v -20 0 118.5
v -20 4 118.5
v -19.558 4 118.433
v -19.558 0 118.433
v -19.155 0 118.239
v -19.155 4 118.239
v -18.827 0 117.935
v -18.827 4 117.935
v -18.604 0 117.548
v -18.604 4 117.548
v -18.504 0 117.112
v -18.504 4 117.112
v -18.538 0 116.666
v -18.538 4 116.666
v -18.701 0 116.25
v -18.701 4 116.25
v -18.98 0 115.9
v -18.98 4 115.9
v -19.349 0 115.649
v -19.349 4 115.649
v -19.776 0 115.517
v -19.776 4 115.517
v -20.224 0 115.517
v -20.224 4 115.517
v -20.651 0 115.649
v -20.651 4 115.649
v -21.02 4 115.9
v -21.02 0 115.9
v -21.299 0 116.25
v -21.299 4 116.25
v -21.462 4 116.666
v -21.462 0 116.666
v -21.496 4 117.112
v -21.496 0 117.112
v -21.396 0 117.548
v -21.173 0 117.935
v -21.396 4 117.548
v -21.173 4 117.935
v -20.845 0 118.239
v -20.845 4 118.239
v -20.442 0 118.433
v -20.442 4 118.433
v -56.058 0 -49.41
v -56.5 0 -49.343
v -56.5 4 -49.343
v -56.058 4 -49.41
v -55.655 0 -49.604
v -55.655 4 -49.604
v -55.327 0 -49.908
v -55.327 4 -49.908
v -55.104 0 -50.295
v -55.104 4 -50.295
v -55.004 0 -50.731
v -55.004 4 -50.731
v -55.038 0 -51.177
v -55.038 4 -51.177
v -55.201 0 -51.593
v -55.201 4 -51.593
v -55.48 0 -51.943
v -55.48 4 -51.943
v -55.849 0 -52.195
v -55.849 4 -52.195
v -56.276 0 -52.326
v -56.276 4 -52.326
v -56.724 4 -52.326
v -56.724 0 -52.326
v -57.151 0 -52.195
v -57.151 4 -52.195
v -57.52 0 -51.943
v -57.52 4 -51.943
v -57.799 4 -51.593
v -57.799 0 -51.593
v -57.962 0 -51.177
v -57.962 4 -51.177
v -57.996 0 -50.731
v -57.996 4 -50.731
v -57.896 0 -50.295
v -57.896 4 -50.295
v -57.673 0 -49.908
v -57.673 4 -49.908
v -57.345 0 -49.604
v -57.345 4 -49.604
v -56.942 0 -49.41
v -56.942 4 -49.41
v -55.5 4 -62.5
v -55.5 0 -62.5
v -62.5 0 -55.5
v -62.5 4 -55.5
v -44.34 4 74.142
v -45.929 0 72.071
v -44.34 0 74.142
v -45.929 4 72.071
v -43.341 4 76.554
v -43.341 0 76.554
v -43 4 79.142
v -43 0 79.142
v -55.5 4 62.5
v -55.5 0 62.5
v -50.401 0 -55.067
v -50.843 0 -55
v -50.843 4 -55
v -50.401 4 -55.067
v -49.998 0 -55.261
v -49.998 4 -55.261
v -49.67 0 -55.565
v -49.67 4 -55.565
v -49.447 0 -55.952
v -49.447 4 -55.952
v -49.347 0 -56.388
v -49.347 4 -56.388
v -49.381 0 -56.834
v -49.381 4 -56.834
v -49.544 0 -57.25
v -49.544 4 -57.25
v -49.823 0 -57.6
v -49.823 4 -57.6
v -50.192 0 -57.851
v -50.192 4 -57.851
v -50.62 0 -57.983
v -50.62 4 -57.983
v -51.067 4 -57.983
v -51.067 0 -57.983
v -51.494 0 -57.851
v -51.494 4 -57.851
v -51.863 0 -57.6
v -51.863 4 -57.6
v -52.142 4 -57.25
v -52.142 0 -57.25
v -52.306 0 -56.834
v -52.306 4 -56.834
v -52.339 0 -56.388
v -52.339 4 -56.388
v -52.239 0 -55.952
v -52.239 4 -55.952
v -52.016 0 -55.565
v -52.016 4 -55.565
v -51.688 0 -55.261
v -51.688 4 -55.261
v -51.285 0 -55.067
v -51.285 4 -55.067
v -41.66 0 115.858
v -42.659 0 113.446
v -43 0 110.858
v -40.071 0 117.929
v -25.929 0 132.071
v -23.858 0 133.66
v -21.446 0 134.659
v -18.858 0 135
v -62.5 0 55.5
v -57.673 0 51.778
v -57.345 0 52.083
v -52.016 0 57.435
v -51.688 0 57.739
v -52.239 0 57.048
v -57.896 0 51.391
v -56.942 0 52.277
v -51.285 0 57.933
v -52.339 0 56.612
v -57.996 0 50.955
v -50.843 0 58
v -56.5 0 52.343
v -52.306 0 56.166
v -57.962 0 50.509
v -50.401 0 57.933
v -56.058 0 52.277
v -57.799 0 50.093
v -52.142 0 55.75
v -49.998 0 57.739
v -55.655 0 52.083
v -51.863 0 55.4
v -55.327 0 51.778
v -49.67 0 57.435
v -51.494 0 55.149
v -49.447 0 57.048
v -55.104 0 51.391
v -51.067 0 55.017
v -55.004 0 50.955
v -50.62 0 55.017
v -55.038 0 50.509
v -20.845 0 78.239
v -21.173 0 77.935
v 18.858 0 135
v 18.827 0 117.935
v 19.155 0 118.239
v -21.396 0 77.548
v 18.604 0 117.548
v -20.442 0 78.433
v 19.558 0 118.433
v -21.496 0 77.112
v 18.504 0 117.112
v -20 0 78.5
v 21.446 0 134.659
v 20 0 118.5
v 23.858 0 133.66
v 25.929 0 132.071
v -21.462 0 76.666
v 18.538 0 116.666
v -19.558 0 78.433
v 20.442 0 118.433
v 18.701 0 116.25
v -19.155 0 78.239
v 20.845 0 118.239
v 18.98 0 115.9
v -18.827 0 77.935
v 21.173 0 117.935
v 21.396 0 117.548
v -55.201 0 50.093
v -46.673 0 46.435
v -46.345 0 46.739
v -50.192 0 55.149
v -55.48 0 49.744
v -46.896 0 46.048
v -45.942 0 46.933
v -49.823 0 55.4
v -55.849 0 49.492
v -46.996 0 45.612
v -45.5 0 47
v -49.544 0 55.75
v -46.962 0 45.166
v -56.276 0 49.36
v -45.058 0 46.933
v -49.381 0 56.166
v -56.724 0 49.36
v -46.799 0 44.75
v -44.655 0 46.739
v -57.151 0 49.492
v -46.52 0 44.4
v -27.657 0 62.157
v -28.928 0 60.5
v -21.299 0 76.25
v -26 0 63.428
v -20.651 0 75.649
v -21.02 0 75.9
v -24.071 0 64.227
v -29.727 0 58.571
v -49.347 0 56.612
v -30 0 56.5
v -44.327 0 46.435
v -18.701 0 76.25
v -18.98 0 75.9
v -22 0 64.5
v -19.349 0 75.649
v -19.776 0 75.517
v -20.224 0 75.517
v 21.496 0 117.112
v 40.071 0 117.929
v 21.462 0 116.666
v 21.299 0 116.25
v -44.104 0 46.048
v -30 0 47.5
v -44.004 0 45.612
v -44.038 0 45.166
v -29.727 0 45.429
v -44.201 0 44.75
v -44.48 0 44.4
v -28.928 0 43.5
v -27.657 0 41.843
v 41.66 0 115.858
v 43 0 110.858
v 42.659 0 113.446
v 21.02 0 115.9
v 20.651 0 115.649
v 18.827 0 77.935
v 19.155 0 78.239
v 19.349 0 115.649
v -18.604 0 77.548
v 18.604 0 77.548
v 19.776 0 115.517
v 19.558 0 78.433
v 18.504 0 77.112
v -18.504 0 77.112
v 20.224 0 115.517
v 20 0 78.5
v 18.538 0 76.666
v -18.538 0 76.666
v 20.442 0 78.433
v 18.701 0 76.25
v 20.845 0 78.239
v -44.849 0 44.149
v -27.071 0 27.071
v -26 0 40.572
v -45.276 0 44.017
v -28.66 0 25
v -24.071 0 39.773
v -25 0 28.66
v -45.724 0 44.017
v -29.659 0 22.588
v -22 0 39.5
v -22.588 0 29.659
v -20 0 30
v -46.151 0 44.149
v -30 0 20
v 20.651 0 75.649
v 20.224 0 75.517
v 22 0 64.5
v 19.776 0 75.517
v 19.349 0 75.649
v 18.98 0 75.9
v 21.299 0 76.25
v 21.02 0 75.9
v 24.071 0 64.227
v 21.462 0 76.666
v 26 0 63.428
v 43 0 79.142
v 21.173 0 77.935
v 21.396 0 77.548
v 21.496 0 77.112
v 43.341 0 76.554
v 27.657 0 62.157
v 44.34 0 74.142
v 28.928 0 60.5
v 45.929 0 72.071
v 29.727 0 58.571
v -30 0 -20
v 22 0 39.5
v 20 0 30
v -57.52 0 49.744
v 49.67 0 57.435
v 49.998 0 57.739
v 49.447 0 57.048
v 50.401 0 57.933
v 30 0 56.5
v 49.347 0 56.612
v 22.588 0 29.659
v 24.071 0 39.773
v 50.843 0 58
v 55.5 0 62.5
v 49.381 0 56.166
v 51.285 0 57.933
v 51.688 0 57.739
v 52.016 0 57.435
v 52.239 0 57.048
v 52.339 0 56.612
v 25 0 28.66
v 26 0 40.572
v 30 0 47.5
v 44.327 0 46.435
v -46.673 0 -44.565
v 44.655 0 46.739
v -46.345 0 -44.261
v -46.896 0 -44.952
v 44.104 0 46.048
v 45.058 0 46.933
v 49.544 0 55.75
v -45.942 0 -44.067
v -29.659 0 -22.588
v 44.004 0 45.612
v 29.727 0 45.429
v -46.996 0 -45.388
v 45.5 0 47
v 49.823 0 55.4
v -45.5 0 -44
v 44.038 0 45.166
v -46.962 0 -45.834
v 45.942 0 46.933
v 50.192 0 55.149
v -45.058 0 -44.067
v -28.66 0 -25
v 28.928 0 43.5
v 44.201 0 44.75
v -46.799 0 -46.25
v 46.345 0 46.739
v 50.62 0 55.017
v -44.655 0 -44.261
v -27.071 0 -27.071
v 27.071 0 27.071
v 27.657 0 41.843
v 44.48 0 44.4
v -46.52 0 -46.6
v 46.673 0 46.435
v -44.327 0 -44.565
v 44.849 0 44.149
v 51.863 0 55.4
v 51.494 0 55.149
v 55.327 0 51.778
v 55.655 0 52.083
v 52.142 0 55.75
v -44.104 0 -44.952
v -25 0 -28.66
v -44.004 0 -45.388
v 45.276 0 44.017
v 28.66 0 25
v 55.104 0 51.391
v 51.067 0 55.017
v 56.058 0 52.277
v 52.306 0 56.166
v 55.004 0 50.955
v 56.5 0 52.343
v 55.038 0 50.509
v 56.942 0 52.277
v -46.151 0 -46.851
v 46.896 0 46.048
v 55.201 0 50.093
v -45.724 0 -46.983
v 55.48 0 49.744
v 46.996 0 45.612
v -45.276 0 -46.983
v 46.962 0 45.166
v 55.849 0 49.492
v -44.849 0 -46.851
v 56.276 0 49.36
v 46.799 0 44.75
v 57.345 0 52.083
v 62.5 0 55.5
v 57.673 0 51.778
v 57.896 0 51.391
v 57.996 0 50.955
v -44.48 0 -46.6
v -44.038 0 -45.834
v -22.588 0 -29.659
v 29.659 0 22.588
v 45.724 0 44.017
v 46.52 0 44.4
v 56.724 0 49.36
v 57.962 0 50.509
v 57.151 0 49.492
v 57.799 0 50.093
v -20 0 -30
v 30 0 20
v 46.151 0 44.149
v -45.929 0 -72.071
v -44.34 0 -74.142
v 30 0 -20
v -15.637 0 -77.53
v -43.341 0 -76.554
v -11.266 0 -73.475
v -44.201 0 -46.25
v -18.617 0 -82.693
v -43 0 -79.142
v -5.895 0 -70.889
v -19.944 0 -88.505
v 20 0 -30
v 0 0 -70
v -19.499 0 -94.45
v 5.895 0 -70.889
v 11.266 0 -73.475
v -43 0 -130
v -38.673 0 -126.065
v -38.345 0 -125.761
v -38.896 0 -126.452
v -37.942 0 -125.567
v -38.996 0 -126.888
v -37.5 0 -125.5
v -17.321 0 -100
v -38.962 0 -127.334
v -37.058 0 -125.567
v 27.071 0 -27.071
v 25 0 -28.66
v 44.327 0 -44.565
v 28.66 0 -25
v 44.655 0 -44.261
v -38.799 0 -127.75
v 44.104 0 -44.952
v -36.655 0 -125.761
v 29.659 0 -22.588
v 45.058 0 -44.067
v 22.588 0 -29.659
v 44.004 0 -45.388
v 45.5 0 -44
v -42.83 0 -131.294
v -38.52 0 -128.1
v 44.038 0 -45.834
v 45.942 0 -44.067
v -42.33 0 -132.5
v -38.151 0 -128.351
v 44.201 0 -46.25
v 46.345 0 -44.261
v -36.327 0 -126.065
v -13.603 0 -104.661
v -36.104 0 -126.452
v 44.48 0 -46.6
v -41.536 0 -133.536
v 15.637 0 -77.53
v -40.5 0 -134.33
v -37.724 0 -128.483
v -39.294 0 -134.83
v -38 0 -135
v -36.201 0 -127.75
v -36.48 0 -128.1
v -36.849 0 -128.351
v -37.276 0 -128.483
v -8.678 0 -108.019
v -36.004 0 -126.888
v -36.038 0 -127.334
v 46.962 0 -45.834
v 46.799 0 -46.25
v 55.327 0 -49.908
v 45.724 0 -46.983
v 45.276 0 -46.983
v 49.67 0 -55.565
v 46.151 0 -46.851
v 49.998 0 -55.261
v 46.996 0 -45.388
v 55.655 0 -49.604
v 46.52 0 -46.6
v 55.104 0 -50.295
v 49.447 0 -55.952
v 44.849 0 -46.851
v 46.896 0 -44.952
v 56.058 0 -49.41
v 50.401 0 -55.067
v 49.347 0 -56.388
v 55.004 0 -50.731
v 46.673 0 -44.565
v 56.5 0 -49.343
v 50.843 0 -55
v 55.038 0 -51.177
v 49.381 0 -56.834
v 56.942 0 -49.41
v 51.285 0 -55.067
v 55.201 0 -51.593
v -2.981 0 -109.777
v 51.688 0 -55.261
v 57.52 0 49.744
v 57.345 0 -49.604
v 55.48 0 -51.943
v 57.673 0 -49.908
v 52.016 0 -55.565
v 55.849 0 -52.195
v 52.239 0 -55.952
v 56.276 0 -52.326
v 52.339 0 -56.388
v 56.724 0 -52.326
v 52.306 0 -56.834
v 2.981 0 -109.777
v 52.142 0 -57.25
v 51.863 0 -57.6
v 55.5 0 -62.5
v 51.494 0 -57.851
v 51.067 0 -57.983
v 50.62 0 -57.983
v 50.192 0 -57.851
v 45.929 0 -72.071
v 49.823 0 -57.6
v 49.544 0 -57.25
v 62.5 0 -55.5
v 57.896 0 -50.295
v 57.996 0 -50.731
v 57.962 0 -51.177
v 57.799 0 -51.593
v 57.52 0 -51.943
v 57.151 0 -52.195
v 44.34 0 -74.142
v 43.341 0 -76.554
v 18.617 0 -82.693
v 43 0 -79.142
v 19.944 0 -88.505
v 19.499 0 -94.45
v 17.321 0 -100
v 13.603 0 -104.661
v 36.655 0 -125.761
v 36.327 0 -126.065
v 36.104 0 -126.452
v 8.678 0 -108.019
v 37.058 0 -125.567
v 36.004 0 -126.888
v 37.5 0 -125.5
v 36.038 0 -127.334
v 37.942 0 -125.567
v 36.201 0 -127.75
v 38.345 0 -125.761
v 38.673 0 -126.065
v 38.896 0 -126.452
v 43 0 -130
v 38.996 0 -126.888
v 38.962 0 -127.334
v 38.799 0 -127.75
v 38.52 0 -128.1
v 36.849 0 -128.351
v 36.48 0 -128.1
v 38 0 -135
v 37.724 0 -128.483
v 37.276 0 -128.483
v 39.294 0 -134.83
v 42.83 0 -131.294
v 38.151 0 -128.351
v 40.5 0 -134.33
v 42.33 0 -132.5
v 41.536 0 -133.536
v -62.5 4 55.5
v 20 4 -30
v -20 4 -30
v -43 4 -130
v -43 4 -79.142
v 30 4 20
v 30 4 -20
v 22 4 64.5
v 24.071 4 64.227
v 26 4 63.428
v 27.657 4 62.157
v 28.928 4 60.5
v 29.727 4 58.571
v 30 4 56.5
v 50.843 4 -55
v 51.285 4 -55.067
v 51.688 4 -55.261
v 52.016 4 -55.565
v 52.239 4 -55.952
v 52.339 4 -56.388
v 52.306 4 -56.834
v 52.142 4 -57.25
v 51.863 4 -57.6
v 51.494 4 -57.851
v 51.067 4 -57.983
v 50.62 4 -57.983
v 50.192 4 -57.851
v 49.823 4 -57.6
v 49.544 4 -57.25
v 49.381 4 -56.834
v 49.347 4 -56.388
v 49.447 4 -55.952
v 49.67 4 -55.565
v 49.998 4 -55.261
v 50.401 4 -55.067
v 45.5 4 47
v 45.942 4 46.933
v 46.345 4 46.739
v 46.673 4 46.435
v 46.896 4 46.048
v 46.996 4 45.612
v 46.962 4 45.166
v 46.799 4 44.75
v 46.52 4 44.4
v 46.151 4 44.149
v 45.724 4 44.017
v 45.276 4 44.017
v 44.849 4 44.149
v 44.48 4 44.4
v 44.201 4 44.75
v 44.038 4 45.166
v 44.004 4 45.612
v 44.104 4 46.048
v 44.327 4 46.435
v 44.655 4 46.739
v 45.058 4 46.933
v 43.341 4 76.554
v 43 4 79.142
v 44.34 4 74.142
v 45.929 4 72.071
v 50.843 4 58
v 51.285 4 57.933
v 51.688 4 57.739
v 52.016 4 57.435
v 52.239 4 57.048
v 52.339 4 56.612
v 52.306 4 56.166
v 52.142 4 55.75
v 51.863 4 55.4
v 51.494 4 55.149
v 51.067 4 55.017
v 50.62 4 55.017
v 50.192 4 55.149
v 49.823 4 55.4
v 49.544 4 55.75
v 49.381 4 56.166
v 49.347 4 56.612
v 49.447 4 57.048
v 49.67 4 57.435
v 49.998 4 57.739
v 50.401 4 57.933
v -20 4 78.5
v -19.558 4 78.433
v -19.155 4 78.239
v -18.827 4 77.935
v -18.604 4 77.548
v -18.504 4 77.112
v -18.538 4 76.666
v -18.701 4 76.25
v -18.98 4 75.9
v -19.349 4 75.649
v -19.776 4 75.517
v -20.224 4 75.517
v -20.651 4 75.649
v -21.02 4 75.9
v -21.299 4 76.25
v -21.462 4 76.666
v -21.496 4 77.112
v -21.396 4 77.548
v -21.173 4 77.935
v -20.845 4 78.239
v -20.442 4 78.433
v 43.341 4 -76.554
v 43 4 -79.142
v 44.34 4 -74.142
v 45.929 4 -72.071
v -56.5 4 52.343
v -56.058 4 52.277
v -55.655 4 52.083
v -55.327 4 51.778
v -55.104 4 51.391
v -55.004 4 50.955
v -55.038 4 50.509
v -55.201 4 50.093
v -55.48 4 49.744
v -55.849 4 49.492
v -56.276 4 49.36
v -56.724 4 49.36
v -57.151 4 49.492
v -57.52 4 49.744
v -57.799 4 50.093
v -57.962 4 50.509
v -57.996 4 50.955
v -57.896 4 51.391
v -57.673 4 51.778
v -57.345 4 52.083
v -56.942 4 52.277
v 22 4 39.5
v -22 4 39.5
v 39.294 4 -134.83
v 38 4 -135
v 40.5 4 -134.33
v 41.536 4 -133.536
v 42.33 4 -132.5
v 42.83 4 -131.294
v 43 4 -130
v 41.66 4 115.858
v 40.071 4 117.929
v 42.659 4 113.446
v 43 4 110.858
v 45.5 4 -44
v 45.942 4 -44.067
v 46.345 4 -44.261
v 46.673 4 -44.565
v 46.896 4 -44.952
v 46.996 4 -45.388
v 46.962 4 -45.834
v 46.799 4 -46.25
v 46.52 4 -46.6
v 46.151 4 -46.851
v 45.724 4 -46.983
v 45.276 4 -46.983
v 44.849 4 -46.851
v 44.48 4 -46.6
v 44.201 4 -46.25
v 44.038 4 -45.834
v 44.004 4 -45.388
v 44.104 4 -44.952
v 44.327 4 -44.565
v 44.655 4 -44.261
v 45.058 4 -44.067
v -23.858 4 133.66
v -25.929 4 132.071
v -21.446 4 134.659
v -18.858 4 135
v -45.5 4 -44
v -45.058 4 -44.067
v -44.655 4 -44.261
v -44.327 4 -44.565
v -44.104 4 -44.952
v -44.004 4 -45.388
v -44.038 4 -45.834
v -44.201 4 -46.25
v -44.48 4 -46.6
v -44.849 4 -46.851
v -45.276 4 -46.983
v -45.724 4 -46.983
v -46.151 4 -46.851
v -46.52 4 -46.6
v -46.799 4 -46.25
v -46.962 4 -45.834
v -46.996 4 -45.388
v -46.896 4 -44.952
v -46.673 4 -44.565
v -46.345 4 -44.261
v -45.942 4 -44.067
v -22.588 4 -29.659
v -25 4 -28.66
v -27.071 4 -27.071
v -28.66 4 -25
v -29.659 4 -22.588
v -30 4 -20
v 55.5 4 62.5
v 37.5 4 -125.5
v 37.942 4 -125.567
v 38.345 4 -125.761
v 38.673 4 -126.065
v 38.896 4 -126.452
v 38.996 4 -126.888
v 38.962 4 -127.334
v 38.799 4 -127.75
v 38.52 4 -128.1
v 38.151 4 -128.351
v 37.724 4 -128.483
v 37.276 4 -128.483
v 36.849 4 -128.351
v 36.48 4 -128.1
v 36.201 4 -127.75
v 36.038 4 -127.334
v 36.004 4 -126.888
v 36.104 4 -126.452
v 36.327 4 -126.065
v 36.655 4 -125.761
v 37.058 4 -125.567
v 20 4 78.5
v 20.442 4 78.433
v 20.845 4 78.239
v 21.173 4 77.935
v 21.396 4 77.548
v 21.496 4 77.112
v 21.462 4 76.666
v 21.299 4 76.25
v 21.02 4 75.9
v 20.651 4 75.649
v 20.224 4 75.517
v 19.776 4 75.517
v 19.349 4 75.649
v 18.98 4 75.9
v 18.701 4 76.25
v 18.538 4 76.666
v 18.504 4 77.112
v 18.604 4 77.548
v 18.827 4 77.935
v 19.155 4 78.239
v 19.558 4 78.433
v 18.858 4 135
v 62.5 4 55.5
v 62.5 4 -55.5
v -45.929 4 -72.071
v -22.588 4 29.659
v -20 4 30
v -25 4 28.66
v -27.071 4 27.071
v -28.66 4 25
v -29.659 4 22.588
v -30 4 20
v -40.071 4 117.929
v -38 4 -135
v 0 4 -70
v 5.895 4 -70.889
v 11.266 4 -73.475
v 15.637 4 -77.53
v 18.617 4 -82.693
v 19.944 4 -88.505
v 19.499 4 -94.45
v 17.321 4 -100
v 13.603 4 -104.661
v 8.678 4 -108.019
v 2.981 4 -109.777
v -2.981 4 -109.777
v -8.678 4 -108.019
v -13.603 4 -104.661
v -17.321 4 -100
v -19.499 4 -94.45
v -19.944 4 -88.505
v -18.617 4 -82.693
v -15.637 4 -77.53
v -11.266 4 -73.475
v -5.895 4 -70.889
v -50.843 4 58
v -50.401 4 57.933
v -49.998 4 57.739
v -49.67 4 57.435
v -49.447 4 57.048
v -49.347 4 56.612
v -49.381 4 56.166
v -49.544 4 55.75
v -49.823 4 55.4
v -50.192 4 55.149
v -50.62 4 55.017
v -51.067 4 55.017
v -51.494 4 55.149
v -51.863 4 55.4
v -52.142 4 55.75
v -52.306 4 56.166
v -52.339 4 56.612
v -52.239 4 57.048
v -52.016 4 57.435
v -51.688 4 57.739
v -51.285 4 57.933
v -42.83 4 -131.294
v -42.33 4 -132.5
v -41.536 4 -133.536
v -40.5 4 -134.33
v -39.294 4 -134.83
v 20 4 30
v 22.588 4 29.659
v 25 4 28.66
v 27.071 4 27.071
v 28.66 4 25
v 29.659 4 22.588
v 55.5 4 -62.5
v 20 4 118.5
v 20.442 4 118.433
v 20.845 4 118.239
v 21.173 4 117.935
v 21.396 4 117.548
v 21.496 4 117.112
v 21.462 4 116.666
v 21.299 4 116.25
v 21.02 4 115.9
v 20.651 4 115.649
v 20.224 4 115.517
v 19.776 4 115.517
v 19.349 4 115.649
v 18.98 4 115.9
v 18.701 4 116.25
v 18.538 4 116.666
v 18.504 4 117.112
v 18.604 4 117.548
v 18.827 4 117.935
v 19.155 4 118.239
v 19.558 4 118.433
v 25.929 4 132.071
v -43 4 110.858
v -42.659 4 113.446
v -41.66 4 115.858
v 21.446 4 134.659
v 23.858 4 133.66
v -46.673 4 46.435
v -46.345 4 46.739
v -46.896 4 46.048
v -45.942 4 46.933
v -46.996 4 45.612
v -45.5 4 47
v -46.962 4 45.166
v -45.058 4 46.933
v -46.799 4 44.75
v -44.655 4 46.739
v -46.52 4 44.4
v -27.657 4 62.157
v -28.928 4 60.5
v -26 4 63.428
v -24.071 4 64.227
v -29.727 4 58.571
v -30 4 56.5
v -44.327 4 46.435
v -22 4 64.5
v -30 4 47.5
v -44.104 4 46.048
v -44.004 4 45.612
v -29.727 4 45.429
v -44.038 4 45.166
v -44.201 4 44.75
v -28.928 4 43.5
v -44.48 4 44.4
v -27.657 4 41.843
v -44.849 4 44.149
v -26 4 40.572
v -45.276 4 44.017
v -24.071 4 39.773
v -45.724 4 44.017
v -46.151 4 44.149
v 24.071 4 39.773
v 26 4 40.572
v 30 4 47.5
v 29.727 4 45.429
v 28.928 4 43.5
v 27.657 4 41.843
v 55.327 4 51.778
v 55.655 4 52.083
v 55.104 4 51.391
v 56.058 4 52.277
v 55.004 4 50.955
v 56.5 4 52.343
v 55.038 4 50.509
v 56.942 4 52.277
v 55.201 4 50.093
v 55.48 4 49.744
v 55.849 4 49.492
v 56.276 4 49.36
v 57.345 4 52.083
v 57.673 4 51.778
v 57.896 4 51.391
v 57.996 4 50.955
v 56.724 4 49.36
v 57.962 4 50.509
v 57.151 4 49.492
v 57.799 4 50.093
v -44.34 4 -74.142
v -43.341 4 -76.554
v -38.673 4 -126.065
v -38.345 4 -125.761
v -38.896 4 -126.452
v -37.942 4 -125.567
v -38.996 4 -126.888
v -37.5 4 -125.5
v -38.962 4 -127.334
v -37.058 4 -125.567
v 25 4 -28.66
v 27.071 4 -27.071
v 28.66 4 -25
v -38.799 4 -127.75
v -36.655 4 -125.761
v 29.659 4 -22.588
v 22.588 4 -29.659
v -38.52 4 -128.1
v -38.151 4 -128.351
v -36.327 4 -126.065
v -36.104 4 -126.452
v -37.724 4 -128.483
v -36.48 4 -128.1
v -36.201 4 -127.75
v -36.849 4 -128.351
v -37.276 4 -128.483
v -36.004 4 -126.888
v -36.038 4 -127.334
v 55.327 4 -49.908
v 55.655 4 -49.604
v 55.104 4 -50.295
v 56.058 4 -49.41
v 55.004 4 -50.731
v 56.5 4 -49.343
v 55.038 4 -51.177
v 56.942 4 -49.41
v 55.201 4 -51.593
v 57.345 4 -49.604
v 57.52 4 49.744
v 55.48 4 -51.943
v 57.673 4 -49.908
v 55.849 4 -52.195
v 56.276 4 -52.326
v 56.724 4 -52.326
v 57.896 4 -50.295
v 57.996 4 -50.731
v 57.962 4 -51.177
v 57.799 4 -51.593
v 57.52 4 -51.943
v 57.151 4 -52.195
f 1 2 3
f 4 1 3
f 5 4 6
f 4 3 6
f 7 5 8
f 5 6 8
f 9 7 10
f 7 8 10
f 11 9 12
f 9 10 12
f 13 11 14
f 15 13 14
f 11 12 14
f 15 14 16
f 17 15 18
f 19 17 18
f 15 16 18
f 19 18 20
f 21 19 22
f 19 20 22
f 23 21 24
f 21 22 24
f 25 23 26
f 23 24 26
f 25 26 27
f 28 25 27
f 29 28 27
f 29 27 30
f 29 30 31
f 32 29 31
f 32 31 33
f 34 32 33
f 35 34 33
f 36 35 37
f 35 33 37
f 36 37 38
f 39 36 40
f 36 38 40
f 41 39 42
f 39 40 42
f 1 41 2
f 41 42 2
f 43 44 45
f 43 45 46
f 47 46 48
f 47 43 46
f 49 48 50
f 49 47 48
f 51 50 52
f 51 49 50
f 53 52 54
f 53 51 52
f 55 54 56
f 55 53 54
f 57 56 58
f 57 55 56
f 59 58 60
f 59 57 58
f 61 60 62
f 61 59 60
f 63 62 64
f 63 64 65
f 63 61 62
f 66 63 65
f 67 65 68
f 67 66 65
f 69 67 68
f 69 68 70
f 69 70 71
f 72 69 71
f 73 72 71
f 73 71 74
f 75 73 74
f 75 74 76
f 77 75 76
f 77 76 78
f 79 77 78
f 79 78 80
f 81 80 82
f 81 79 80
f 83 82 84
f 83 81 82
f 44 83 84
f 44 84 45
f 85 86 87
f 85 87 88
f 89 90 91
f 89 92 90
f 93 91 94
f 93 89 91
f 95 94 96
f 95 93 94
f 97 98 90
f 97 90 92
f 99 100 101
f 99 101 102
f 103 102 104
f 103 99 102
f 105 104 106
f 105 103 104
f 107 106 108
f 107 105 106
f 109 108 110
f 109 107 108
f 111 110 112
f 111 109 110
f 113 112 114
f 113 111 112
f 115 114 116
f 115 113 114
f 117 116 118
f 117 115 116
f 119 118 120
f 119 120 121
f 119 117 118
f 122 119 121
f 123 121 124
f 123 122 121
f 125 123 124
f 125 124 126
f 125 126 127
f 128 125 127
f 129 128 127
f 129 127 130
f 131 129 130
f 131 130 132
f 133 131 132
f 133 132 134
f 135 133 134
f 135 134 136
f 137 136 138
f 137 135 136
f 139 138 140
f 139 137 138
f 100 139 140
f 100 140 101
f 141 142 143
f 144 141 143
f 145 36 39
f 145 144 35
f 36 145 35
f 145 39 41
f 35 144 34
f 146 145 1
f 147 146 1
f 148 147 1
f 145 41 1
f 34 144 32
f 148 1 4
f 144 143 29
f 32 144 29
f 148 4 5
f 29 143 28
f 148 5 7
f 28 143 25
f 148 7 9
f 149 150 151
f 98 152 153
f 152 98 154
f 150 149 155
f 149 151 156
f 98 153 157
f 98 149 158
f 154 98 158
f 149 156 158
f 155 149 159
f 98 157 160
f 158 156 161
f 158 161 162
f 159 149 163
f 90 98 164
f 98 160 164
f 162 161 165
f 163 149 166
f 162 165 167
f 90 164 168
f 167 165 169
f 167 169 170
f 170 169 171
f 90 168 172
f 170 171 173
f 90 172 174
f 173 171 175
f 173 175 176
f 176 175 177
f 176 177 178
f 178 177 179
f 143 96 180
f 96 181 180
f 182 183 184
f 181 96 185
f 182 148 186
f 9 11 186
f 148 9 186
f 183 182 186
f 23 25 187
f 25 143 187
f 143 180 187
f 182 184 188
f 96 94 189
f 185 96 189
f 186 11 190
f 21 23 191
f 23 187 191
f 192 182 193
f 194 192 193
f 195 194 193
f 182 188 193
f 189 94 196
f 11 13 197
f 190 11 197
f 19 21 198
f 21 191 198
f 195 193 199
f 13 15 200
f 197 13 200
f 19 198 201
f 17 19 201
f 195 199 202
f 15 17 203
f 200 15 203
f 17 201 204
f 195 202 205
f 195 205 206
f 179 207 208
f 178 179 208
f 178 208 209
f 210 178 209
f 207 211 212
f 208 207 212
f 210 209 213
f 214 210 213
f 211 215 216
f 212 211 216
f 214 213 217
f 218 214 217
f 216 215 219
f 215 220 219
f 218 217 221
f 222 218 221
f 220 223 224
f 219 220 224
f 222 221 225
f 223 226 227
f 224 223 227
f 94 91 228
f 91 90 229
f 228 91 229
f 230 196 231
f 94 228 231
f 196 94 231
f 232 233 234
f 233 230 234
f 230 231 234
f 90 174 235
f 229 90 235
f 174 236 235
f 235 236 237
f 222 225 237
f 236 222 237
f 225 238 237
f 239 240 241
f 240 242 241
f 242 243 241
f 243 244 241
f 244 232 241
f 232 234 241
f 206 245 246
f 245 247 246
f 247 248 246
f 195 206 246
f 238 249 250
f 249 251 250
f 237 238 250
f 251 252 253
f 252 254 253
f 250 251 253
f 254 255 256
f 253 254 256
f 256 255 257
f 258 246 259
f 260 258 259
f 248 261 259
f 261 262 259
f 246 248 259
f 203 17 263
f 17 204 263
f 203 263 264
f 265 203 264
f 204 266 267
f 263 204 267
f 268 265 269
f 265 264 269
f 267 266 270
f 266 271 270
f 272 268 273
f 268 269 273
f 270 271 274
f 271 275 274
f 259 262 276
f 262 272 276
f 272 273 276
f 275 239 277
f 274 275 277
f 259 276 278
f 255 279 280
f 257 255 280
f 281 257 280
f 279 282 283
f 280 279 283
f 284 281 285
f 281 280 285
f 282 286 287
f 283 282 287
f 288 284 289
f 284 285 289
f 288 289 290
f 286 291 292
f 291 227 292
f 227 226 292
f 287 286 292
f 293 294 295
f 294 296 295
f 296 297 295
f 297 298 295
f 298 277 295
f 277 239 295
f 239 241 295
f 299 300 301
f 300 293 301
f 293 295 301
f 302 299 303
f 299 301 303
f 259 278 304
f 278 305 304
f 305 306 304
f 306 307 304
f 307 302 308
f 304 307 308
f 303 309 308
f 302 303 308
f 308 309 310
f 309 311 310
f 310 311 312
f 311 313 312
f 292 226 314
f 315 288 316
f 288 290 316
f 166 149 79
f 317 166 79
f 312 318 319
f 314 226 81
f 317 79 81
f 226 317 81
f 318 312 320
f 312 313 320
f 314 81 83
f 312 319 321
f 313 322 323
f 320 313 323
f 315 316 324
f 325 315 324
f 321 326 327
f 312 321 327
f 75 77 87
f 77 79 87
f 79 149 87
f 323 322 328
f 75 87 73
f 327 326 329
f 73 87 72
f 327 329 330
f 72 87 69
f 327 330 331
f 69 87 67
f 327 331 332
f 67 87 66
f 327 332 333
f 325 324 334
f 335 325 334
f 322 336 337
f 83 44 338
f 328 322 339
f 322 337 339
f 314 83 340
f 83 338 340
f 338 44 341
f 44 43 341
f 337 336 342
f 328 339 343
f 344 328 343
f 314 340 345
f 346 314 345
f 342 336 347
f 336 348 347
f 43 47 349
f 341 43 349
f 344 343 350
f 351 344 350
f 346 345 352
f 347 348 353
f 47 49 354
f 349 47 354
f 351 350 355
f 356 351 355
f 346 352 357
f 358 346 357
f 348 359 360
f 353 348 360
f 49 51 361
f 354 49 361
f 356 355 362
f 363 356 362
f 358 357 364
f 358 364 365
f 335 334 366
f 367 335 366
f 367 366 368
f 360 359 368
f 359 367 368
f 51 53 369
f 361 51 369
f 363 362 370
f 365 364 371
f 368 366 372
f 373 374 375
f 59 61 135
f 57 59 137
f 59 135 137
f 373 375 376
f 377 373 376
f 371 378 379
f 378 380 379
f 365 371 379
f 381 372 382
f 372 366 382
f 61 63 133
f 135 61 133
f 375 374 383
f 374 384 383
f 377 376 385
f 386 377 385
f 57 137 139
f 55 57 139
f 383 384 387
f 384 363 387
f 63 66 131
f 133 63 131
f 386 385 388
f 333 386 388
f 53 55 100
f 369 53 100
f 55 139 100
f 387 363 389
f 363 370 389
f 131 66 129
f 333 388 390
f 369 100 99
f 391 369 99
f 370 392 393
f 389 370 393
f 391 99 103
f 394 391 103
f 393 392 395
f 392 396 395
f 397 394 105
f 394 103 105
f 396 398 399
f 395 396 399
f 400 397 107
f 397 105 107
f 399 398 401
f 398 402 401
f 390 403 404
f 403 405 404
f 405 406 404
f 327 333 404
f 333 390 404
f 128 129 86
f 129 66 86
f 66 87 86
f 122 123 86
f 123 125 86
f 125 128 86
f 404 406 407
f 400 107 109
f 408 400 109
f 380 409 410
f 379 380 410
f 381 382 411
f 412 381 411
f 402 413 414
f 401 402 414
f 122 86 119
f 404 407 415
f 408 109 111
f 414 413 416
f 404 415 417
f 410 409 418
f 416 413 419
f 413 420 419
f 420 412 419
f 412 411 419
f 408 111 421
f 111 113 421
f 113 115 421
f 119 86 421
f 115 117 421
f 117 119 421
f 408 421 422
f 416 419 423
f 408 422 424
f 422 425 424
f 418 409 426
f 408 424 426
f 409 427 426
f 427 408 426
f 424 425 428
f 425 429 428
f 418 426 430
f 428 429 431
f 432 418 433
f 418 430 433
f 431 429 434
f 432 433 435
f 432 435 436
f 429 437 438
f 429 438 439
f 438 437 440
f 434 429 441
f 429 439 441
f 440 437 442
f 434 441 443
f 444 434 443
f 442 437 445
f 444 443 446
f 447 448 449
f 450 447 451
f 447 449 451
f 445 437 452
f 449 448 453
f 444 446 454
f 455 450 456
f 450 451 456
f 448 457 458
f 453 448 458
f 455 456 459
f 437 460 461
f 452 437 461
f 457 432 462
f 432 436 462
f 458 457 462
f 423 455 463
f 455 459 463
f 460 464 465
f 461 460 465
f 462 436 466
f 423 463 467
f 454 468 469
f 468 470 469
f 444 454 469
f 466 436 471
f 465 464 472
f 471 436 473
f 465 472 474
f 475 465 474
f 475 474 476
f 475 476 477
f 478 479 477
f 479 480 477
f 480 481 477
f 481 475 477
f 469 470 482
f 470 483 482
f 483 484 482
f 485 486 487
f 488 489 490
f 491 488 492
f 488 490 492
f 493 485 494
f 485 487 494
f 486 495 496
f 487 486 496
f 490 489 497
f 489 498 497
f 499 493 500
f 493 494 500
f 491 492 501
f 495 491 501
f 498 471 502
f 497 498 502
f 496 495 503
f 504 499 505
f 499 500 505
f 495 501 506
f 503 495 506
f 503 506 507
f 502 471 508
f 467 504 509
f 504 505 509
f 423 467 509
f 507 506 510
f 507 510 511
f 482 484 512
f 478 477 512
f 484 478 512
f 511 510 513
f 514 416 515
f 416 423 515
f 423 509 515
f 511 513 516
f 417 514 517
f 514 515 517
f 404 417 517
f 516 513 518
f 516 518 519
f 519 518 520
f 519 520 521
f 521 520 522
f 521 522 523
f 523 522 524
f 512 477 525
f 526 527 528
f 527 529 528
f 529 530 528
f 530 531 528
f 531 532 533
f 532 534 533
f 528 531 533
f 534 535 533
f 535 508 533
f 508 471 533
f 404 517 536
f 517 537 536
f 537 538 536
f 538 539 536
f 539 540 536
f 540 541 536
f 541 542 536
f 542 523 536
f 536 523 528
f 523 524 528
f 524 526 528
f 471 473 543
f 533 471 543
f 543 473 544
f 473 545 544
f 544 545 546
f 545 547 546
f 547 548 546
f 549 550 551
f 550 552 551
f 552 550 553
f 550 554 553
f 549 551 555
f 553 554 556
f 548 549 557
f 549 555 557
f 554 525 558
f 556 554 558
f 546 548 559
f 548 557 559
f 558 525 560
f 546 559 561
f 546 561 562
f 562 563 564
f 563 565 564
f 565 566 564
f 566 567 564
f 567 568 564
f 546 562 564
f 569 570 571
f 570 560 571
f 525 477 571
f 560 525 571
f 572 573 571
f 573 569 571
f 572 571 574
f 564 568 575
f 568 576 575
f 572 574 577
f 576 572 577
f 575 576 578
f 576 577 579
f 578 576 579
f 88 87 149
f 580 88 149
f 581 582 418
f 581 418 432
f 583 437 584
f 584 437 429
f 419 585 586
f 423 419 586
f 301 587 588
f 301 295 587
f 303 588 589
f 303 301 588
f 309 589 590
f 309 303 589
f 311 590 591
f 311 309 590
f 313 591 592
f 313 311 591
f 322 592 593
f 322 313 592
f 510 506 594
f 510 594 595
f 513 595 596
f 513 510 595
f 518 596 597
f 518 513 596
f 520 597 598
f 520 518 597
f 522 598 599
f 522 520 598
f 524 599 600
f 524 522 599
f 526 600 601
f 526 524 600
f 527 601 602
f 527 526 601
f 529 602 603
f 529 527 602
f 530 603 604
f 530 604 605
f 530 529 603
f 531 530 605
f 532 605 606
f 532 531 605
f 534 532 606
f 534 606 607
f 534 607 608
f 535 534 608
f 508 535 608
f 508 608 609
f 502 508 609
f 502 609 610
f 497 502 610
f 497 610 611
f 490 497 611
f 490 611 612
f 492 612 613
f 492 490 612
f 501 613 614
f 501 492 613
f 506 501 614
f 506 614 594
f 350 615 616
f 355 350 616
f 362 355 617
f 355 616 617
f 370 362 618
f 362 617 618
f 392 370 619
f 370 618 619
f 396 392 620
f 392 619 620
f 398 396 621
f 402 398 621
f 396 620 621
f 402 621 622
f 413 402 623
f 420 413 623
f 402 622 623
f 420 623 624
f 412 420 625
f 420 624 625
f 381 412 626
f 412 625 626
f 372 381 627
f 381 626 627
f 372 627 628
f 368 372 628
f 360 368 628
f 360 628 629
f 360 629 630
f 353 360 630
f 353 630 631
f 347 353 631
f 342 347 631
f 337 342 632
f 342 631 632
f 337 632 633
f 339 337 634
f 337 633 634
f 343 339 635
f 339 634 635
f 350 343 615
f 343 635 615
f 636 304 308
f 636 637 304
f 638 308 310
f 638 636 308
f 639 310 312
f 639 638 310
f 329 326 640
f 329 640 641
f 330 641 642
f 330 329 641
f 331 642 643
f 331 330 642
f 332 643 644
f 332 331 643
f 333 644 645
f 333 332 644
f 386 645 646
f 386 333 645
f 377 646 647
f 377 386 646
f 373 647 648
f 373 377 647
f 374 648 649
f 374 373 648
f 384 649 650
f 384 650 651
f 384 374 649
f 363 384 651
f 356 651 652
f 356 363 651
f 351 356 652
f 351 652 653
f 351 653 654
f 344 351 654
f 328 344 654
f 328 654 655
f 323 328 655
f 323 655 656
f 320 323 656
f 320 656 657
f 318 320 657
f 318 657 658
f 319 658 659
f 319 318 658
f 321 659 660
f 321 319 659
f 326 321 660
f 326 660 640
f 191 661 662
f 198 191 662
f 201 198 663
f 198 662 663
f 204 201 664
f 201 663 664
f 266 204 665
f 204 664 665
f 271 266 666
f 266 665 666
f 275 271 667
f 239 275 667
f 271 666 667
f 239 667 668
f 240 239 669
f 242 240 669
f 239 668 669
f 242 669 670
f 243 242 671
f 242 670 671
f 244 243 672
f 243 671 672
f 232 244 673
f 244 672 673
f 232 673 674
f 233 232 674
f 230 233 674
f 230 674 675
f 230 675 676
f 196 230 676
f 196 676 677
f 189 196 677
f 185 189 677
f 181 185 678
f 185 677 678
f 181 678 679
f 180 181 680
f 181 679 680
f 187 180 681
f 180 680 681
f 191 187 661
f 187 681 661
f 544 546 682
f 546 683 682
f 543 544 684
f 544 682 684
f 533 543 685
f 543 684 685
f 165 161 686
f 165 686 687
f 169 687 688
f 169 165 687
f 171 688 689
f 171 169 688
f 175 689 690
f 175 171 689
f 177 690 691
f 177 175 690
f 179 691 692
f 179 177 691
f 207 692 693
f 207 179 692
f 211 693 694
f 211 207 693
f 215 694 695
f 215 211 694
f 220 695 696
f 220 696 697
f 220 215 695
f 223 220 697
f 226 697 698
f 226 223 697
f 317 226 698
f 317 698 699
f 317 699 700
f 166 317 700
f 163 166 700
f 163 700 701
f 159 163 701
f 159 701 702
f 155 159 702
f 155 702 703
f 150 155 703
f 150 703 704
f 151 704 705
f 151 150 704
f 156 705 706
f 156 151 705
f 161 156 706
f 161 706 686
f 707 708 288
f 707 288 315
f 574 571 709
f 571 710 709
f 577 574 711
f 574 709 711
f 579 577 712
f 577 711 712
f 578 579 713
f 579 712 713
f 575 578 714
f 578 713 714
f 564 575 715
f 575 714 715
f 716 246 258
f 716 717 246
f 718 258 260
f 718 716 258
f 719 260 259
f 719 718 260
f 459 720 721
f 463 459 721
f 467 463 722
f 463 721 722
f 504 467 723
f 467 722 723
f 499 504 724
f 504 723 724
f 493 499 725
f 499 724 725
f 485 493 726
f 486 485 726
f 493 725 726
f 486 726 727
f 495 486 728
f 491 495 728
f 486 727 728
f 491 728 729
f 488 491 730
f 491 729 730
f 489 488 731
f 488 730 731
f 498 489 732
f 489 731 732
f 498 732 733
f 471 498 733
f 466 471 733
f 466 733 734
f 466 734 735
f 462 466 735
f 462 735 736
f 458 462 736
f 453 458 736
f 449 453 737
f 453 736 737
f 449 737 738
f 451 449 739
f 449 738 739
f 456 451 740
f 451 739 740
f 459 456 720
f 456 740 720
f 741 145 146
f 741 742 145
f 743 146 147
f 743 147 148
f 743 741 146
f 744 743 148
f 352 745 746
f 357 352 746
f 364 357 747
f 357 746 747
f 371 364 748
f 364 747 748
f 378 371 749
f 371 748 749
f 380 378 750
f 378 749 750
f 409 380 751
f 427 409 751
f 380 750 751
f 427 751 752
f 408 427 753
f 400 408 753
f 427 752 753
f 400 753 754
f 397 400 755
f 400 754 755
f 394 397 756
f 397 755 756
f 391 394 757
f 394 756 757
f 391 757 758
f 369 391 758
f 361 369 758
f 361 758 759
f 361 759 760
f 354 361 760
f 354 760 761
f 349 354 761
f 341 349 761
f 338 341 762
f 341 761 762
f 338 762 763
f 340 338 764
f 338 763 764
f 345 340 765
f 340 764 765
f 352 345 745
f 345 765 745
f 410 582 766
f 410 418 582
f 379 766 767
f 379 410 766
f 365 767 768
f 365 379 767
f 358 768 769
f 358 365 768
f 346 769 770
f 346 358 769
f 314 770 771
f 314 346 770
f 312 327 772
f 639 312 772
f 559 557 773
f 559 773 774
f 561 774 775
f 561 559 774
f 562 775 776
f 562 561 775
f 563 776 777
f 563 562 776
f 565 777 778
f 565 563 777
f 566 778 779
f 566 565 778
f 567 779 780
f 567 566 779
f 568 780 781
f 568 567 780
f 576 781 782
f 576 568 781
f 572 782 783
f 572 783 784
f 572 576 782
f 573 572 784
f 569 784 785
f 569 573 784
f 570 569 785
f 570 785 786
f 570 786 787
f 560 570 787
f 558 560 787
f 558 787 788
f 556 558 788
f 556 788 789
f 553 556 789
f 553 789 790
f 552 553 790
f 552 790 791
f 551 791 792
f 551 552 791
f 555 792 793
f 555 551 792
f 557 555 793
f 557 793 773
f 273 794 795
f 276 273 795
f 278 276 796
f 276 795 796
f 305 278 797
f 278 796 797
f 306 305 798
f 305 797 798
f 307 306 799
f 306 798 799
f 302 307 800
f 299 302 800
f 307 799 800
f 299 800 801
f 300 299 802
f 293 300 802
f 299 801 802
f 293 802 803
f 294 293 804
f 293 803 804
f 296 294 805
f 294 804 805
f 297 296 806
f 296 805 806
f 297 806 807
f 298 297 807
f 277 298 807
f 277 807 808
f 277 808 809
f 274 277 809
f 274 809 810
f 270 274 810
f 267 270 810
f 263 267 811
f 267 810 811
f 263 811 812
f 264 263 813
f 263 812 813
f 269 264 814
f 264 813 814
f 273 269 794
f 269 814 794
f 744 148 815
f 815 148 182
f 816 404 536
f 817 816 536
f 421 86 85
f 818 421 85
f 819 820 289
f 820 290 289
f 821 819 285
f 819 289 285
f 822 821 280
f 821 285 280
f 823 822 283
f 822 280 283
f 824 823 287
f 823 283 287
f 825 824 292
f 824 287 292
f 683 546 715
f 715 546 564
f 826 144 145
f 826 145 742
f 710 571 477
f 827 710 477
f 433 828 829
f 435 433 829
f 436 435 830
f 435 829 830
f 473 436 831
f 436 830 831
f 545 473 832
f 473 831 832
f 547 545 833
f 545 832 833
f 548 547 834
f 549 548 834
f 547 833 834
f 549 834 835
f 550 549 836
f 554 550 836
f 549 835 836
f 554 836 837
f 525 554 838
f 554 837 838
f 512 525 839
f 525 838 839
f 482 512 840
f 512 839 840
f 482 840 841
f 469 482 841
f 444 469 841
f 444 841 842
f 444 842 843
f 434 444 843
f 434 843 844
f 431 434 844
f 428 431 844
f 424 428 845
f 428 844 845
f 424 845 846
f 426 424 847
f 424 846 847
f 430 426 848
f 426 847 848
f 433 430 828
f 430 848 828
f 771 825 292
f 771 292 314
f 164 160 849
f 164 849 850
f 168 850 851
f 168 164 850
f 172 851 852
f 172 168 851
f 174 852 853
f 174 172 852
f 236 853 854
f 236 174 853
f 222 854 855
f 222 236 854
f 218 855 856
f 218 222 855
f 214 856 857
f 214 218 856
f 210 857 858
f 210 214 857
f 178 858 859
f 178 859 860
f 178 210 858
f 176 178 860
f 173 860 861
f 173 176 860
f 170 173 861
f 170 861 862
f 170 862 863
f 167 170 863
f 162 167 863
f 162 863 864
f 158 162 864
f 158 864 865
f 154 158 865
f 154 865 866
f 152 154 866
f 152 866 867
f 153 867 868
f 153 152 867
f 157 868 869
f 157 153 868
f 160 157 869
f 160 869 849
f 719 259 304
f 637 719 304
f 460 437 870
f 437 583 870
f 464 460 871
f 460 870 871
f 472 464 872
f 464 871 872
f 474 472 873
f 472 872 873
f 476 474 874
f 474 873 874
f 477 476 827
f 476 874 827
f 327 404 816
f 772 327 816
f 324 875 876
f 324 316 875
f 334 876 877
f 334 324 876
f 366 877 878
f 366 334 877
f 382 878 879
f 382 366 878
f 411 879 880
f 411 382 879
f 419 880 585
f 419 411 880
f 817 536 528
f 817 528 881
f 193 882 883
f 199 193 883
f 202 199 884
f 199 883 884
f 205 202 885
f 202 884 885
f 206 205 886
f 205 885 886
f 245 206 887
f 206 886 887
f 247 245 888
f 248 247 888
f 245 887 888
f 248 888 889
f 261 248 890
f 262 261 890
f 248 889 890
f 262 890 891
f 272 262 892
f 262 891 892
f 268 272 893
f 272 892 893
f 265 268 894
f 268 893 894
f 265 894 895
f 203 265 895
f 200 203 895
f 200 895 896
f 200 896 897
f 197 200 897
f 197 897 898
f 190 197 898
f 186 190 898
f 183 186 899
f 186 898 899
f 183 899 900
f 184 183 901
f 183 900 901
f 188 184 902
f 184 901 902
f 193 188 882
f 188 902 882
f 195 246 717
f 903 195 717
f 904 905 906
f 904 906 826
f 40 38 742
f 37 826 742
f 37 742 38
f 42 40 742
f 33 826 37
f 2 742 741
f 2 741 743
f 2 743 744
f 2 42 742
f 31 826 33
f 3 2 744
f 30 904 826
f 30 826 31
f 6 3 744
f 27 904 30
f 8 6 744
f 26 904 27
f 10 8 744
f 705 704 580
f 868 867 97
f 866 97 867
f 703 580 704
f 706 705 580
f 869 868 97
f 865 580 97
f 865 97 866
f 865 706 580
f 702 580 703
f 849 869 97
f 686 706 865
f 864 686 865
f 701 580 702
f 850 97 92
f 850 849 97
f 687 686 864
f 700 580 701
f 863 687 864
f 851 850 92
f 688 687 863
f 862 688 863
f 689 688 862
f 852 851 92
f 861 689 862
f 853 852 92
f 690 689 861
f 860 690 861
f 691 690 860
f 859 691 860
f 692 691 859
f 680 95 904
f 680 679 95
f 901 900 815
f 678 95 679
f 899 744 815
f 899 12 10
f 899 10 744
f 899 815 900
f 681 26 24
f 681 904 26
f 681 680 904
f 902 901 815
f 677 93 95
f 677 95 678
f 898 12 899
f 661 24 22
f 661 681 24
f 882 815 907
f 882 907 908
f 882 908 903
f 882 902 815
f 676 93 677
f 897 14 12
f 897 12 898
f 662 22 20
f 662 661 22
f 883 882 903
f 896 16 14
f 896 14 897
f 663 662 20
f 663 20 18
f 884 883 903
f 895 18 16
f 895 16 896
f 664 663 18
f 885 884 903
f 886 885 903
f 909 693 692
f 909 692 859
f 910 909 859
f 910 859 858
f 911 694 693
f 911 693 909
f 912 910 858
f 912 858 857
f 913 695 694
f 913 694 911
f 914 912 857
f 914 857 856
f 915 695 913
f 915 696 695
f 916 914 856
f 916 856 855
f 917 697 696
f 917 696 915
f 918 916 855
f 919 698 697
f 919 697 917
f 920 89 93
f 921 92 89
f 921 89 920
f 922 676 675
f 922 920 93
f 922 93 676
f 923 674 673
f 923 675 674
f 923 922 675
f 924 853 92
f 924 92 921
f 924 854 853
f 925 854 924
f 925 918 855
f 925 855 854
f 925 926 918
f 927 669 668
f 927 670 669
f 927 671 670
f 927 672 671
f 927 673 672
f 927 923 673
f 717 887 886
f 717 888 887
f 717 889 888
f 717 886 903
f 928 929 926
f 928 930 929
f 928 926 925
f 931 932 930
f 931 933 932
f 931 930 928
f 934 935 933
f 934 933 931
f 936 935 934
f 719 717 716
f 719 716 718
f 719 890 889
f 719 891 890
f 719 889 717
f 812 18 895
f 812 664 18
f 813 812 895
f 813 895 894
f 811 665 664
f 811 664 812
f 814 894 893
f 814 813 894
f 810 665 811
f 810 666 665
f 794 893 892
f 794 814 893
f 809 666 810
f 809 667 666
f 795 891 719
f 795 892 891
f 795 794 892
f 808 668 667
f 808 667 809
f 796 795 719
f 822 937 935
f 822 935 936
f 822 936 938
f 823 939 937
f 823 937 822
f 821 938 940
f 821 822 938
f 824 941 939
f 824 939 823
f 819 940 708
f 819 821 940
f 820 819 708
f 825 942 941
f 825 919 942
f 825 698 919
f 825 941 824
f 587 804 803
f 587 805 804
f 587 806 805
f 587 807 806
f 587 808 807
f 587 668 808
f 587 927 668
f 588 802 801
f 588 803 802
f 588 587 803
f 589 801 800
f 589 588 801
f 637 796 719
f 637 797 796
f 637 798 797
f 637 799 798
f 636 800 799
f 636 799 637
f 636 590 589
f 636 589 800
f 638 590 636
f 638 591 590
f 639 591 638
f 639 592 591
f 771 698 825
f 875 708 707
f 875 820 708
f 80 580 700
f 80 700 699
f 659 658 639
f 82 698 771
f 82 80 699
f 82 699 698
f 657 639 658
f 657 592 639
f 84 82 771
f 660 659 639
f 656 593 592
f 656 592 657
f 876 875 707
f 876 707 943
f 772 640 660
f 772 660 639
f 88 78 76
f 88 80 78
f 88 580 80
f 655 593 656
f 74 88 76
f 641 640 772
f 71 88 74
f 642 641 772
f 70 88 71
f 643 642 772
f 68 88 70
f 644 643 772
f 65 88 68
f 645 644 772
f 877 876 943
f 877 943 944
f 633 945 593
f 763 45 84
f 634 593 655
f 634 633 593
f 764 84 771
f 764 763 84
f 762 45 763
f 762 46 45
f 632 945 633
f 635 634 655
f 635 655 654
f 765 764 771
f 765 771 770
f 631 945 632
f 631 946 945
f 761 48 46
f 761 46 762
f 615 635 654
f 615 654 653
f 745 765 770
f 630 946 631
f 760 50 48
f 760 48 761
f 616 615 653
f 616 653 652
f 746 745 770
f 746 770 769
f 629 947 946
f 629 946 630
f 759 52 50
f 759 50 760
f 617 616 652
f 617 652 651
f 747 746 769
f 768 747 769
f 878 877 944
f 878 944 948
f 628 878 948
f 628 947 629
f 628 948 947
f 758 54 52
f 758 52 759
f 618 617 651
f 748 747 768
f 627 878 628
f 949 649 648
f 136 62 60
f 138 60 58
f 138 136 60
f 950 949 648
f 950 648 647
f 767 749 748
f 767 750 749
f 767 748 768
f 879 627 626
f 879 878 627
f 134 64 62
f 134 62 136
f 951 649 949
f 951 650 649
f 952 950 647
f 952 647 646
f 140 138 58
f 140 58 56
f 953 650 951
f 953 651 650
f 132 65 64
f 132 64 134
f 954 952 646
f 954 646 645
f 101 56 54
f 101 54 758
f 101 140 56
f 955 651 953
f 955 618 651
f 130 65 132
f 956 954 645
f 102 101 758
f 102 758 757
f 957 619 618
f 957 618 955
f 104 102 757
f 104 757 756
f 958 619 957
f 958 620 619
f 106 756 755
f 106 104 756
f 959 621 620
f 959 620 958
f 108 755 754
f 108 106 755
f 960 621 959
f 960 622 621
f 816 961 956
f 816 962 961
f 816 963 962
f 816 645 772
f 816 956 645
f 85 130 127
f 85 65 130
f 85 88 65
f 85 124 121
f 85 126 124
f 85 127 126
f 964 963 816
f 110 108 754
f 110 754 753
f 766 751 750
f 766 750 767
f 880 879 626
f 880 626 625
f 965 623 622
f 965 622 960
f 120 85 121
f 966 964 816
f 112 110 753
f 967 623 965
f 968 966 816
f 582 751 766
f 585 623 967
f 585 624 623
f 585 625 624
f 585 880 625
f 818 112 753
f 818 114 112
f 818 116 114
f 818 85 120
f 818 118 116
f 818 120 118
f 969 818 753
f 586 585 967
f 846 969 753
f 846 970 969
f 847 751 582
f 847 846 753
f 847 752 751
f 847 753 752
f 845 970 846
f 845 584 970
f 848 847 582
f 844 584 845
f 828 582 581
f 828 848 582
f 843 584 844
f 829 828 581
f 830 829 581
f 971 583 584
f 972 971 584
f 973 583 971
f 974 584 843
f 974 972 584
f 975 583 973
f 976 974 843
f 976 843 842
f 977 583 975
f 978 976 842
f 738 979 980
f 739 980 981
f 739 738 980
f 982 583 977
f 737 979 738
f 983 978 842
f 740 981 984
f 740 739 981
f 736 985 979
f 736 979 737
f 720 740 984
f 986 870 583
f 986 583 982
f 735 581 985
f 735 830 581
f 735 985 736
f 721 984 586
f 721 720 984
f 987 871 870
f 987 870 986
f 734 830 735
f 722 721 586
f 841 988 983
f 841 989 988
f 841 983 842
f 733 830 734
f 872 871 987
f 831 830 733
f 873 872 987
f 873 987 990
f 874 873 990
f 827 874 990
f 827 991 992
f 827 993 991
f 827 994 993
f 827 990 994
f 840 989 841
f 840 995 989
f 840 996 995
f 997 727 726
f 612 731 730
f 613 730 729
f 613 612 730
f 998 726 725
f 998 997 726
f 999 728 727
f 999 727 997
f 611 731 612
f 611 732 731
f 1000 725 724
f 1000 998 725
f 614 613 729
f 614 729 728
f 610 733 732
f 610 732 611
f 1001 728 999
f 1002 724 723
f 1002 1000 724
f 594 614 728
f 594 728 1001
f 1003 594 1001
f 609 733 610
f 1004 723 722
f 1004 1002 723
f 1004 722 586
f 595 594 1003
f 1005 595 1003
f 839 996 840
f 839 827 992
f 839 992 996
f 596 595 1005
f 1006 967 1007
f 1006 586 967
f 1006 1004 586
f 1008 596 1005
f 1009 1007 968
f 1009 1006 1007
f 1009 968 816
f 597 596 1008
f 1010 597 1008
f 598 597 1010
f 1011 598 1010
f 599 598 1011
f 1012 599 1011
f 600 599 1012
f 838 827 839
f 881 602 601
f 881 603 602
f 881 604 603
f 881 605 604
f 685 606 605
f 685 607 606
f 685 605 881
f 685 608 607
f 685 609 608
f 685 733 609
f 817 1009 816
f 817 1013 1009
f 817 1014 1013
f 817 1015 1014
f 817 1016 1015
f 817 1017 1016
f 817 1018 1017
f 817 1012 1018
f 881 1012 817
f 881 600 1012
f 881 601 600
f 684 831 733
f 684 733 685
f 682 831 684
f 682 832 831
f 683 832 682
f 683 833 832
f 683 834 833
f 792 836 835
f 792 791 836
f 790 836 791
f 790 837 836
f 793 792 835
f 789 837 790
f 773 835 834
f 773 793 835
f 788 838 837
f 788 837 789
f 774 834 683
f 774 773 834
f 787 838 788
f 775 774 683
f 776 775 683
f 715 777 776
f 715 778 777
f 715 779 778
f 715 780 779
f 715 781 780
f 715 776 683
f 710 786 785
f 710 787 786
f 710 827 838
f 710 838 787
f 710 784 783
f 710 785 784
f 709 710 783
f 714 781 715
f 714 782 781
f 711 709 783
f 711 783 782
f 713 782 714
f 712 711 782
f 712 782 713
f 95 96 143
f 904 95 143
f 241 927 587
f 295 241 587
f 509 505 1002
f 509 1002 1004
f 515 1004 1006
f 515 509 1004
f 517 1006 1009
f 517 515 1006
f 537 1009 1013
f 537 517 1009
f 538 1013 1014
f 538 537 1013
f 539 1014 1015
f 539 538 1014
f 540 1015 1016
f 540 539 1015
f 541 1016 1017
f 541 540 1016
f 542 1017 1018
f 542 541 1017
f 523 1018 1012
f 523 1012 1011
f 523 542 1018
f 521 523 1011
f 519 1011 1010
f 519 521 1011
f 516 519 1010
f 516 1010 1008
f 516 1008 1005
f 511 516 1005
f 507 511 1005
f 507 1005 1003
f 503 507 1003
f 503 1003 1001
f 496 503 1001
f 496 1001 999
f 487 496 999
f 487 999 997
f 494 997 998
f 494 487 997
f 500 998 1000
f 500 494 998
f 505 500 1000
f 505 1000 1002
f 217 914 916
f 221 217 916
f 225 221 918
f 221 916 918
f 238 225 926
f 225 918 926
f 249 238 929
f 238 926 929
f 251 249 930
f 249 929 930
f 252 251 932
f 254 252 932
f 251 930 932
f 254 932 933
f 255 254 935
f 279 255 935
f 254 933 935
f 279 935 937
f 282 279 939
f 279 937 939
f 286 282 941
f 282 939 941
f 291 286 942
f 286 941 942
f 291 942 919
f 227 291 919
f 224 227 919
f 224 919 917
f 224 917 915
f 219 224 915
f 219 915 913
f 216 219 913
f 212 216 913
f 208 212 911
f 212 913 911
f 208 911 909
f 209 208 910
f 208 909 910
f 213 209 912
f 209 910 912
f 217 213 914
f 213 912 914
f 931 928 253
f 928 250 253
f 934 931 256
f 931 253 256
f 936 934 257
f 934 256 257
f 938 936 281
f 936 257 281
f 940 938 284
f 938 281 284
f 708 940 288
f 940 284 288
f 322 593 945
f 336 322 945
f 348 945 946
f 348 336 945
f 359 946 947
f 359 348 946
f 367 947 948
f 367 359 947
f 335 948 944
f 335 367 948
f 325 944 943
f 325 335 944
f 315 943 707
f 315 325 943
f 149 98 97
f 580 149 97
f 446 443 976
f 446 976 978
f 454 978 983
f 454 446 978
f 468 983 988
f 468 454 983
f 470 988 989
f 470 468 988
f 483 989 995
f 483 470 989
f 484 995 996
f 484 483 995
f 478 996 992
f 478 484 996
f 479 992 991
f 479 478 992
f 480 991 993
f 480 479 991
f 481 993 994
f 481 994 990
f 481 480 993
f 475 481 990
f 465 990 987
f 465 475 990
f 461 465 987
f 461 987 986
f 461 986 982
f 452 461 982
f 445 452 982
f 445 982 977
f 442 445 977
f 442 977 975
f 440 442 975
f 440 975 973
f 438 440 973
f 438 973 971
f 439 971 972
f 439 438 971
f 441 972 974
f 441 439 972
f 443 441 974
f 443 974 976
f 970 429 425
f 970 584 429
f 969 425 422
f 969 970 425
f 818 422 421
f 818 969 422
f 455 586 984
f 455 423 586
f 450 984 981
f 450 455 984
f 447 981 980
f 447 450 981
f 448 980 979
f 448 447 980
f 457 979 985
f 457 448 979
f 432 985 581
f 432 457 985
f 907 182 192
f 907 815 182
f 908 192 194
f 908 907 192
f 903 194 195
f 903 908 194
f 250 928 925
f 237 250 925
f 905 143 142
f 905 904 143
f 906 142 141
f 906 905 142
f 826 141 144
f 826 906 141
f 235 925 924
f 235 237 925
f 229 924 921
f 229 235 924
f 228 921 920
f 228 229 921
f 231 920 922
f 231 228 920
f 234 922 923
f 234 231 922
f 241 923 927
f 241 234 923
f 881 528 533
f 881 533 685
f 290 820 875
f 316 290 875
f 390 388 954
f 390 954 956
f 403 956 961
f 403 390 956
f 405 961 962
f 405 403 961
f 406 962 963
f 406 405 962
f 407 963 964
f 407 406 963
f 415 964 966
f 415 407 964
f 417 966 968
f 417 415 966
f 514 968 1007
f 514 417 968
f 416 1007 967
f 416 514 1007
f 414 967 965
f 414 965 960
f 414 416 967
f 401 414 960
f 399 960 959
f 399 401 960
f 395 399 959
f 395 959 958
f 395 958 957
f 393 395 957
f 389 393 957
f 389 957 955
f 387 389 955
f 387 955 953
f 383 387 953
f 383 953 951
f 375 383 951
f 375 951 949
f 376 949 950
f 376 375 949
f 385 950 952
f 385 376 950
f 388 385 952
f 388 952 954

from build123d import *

# Parameters (mm, degrees)
SKETCH_1_R          = 1.5
EXTRUDE_1_DEPTH     = 4
CHAMFER_1_SIZE      = 7
SKETCH_3_W          = 60
SKETCH_3_H          = 60
SKETCH_3_R          = 1.5
SKETCH_3_R_2        = 20
SKETCH_3_H_2        = 10
SKETCH_3_H_3        = 5
CUT_EXTRUDE_1_DEPTH = 4
FILLET_3_R          = 10
FILLET_4_R          = 5
FILLET_5_R          = 8
CHAMFER_2_SIZE      = 12.5
FILLET_6_R          = 10
CHAMFER_3_SIZE      = 20
FILLET_7_R          = 10


with BuildPart() as part:
    # 草图1 → 凸台-拉伸1 (new body)
    with BuildSketch(Plane(origin=(0, 0, 0), x_dir=(1, 0, 0), z_dir=(0, 1, 0))):
        Polygon((-62.5, 62.5), (-62.5, -62.5), (-43, -62.5), (-43, -135), (43, -135), (43, -62.5), (62.5, -62.5), (62.5, 62.5), (43, 62.5), (43, 135), (-43, 135), (-43, 62.5), align=None)
        with Locations(Location((-56.5, -50.843145751, 0), (0, 0, 270))):
            Circle(SKETCH_1_R, mode=Mode.SUBTRACT)
        with Locations(Location((-50.843145751, -56.5, 0), (0, 0, 270))):
            Circle(SKETCH_1_R, mode=Mode.SUBTRACT)
        with Locations(Location((50.843145751, -56.5, 0), (0, 0, 270))):
            Circle(SKETCH_1_R, mode=Mode.SUBTRACT)
        with Locations(Location((56.5, -50.843145751, 0), (0, 0, 270))):
            Circle(SKETCH_1_R, mode=Mode.SUBTRACT)
        with Locations(Location((-56.5, 50.843145751, 0), (0, 0, 270))):
            Circle(SKETCH_1_R, mode=Mode.SUBTRACT)
        with Locations(Location((-50.843145751, 56.5, 0), (0, 0, 270))):
            Circle(SKETCH_1_R, mode=Mode.SUBTRACT)
        with Locations(Location((50.843145751, 56.5, 0), (0, 0, 270))):
            Circle(SKETCH_1_R, mode=Mode.SUBTRACT)
        with Locations(Location((56.5, 50.843145751, 0), (0, 0, 270))):
            Circle(SKETCH_1_R, mode=Mode.SUBTRACT)
        with Locations(Location((37.5, 127, 0), (0, 0, 270))):
            Circle(SKETCH_1_R, mode=Mode.SUBTRACT)
        with Locations(Location((-37.5, 127, 0), (0, 0, 270))):
            Circle(SKETCH_1_R, mode=Mode.SUBTRACT)
    extrude(amount=EXTRUDE_1_DEPTH)

    # 倒角1
    chamfer_1_edges = [part.edges().sort_by_distance(p)[0] for p in [
        (-62.5, 2, 62.5),
        (-62.5, 2, -62.5),
        (62.5, 2, -62.5),
        (62.5, 2, 62.5),
    ]]
    chamfer(chamfer_1_edges, length=CHAMFER_1_SIZE)

    # 草图3 → 切除-拉伸1 (cut)
    with BuildSketch(Plane(origin=(0, 4, 0), x_dir=(1, 0, 0), z_dir=(0, 1, 0))):
        Rectangle(SKETCH_3_W, SKETCH_3_H)
        with Locations(Location((-45.5, 45.5, 0), (0, 0, 270))):
            Circle(SKETCH_3_R)
        with Locations(Location((45.5, 45.5, 0), (0, 0, 270))):
            Circle(SKETCH_3_R)
        with Locations(Location((45.5, -45.5, 0), (0, 0, 270))):
            Circle(SKETCH_3_R)
        with Locations(Location((-45.5, -45.5, 0), (0, 0, 270))):
            Circle(SKETCH_3_R)
        with Locations(Location((0, 90, 0), (0, 0, 270))):
            Circle(SKETCH_3_R_2)
        with Locations((0, -44.5)):
            Rectangle(SKETCH_3_W, SKETCH_3_H_2)
        with Locations((0, -54.5)):
            Rectangle(SKETCH_3_W, SKETCH_3_H_2)
        with Locations((0, -62)):
            Rectangle(SKETCH_3_W, SKETCH_3_H_3)
        with Locations(Location((-20, -77, 0), (0, 0, 270))):
            Circle(SKETCH_3_R)
        with Locations(Location((20, -77, 0), (0, 0, 270))):
            Circle(SKETCH_3_R)
        with Locations(Location((20, -117, 0), (0, 0, 270))):
            Circle(SKETCH_3_R)
        with Locations(Location((-20, -117, 0), (0, 0, 270))):
            Circle(SKETCH_3_R)
    extrude(amount=-CUT_EXTRUDE_1_DEPTH, mode=Mode.SUBTRACT)

    # 圆角3
    fillet_3_edges = [part.edges().sort_by_distance(p)[0] for p in [
        (30, 2, 30),
        (-30, 2, 30),
        (-30, 2, -30),
        (30, 2, -30),
    ]]
    fillet(fillet_3_edges, radius=FILLET_3_R)

    # 圆角4
    fillet_4_edges = [part.edges().sort_by_distance(p)[0] for p in [
        (-43, 2, -135),
        (43, 2, -135),
    ]]
    fillet(fillet_4_edges, radius=FILLET_4_R)

    # 圆角5
    fillet_5_edges = [part.edges().sort_by_distance(p)[0] for p in [
        (30, 2, 39.5),
        (30, 2, 64.5),
        (-30, 2, 64.5),
        (-30, 2, 39.5),
    ]]
    fillet(fillet_5_edges, radius=FILLET_5_R)

    # 倒角2
    chamfer_2_edges = [part.edges().sort_by_distance(p)[0] for p in [
        (43, 2, -62.5),
        (-43, 2, -62.5),
        (43, 2, 62.5),
        (-43, 2, 62.5),
    ]]
    chamfer(chamfer_2_edges, length=CHAMFER_2_SIZE - 0.0001)  # a hair under: the kernel refuses the full size

    # 圆角6
    fillet_6_edges = [part.edges().sort_by_distance(p)[0] for p in [
        (43, 2, -74.9999),
        (-43, 2, -74.9999),
        (43, 2, 74.9999),
        (-43, 2, 74.9999),
    ]]
    fillet(fillet_6_edges, radius=FILLET_6_R)

    # 倒角3
    chamfer_3_edges = [part.edges().sort_by_distance(p)[0] for p in [
        (43, 2, 135),
        (-43, 2, 135),
    ]]
    chamfer(chamfer_3_edges, length=CHAMFER_3_SIZE)

    # 圆角7
    fillet_7_edges = [part.edges().sort_by_distance(p)[0] for p in [
        (43, 2, 115),
        (-23, 2, 135),
        (23, 2, 135),
        (-43, 2, 115),
    ]]
    fillet(fillet_7_edges, radius=FILLET_7_R)


solid = part.part
